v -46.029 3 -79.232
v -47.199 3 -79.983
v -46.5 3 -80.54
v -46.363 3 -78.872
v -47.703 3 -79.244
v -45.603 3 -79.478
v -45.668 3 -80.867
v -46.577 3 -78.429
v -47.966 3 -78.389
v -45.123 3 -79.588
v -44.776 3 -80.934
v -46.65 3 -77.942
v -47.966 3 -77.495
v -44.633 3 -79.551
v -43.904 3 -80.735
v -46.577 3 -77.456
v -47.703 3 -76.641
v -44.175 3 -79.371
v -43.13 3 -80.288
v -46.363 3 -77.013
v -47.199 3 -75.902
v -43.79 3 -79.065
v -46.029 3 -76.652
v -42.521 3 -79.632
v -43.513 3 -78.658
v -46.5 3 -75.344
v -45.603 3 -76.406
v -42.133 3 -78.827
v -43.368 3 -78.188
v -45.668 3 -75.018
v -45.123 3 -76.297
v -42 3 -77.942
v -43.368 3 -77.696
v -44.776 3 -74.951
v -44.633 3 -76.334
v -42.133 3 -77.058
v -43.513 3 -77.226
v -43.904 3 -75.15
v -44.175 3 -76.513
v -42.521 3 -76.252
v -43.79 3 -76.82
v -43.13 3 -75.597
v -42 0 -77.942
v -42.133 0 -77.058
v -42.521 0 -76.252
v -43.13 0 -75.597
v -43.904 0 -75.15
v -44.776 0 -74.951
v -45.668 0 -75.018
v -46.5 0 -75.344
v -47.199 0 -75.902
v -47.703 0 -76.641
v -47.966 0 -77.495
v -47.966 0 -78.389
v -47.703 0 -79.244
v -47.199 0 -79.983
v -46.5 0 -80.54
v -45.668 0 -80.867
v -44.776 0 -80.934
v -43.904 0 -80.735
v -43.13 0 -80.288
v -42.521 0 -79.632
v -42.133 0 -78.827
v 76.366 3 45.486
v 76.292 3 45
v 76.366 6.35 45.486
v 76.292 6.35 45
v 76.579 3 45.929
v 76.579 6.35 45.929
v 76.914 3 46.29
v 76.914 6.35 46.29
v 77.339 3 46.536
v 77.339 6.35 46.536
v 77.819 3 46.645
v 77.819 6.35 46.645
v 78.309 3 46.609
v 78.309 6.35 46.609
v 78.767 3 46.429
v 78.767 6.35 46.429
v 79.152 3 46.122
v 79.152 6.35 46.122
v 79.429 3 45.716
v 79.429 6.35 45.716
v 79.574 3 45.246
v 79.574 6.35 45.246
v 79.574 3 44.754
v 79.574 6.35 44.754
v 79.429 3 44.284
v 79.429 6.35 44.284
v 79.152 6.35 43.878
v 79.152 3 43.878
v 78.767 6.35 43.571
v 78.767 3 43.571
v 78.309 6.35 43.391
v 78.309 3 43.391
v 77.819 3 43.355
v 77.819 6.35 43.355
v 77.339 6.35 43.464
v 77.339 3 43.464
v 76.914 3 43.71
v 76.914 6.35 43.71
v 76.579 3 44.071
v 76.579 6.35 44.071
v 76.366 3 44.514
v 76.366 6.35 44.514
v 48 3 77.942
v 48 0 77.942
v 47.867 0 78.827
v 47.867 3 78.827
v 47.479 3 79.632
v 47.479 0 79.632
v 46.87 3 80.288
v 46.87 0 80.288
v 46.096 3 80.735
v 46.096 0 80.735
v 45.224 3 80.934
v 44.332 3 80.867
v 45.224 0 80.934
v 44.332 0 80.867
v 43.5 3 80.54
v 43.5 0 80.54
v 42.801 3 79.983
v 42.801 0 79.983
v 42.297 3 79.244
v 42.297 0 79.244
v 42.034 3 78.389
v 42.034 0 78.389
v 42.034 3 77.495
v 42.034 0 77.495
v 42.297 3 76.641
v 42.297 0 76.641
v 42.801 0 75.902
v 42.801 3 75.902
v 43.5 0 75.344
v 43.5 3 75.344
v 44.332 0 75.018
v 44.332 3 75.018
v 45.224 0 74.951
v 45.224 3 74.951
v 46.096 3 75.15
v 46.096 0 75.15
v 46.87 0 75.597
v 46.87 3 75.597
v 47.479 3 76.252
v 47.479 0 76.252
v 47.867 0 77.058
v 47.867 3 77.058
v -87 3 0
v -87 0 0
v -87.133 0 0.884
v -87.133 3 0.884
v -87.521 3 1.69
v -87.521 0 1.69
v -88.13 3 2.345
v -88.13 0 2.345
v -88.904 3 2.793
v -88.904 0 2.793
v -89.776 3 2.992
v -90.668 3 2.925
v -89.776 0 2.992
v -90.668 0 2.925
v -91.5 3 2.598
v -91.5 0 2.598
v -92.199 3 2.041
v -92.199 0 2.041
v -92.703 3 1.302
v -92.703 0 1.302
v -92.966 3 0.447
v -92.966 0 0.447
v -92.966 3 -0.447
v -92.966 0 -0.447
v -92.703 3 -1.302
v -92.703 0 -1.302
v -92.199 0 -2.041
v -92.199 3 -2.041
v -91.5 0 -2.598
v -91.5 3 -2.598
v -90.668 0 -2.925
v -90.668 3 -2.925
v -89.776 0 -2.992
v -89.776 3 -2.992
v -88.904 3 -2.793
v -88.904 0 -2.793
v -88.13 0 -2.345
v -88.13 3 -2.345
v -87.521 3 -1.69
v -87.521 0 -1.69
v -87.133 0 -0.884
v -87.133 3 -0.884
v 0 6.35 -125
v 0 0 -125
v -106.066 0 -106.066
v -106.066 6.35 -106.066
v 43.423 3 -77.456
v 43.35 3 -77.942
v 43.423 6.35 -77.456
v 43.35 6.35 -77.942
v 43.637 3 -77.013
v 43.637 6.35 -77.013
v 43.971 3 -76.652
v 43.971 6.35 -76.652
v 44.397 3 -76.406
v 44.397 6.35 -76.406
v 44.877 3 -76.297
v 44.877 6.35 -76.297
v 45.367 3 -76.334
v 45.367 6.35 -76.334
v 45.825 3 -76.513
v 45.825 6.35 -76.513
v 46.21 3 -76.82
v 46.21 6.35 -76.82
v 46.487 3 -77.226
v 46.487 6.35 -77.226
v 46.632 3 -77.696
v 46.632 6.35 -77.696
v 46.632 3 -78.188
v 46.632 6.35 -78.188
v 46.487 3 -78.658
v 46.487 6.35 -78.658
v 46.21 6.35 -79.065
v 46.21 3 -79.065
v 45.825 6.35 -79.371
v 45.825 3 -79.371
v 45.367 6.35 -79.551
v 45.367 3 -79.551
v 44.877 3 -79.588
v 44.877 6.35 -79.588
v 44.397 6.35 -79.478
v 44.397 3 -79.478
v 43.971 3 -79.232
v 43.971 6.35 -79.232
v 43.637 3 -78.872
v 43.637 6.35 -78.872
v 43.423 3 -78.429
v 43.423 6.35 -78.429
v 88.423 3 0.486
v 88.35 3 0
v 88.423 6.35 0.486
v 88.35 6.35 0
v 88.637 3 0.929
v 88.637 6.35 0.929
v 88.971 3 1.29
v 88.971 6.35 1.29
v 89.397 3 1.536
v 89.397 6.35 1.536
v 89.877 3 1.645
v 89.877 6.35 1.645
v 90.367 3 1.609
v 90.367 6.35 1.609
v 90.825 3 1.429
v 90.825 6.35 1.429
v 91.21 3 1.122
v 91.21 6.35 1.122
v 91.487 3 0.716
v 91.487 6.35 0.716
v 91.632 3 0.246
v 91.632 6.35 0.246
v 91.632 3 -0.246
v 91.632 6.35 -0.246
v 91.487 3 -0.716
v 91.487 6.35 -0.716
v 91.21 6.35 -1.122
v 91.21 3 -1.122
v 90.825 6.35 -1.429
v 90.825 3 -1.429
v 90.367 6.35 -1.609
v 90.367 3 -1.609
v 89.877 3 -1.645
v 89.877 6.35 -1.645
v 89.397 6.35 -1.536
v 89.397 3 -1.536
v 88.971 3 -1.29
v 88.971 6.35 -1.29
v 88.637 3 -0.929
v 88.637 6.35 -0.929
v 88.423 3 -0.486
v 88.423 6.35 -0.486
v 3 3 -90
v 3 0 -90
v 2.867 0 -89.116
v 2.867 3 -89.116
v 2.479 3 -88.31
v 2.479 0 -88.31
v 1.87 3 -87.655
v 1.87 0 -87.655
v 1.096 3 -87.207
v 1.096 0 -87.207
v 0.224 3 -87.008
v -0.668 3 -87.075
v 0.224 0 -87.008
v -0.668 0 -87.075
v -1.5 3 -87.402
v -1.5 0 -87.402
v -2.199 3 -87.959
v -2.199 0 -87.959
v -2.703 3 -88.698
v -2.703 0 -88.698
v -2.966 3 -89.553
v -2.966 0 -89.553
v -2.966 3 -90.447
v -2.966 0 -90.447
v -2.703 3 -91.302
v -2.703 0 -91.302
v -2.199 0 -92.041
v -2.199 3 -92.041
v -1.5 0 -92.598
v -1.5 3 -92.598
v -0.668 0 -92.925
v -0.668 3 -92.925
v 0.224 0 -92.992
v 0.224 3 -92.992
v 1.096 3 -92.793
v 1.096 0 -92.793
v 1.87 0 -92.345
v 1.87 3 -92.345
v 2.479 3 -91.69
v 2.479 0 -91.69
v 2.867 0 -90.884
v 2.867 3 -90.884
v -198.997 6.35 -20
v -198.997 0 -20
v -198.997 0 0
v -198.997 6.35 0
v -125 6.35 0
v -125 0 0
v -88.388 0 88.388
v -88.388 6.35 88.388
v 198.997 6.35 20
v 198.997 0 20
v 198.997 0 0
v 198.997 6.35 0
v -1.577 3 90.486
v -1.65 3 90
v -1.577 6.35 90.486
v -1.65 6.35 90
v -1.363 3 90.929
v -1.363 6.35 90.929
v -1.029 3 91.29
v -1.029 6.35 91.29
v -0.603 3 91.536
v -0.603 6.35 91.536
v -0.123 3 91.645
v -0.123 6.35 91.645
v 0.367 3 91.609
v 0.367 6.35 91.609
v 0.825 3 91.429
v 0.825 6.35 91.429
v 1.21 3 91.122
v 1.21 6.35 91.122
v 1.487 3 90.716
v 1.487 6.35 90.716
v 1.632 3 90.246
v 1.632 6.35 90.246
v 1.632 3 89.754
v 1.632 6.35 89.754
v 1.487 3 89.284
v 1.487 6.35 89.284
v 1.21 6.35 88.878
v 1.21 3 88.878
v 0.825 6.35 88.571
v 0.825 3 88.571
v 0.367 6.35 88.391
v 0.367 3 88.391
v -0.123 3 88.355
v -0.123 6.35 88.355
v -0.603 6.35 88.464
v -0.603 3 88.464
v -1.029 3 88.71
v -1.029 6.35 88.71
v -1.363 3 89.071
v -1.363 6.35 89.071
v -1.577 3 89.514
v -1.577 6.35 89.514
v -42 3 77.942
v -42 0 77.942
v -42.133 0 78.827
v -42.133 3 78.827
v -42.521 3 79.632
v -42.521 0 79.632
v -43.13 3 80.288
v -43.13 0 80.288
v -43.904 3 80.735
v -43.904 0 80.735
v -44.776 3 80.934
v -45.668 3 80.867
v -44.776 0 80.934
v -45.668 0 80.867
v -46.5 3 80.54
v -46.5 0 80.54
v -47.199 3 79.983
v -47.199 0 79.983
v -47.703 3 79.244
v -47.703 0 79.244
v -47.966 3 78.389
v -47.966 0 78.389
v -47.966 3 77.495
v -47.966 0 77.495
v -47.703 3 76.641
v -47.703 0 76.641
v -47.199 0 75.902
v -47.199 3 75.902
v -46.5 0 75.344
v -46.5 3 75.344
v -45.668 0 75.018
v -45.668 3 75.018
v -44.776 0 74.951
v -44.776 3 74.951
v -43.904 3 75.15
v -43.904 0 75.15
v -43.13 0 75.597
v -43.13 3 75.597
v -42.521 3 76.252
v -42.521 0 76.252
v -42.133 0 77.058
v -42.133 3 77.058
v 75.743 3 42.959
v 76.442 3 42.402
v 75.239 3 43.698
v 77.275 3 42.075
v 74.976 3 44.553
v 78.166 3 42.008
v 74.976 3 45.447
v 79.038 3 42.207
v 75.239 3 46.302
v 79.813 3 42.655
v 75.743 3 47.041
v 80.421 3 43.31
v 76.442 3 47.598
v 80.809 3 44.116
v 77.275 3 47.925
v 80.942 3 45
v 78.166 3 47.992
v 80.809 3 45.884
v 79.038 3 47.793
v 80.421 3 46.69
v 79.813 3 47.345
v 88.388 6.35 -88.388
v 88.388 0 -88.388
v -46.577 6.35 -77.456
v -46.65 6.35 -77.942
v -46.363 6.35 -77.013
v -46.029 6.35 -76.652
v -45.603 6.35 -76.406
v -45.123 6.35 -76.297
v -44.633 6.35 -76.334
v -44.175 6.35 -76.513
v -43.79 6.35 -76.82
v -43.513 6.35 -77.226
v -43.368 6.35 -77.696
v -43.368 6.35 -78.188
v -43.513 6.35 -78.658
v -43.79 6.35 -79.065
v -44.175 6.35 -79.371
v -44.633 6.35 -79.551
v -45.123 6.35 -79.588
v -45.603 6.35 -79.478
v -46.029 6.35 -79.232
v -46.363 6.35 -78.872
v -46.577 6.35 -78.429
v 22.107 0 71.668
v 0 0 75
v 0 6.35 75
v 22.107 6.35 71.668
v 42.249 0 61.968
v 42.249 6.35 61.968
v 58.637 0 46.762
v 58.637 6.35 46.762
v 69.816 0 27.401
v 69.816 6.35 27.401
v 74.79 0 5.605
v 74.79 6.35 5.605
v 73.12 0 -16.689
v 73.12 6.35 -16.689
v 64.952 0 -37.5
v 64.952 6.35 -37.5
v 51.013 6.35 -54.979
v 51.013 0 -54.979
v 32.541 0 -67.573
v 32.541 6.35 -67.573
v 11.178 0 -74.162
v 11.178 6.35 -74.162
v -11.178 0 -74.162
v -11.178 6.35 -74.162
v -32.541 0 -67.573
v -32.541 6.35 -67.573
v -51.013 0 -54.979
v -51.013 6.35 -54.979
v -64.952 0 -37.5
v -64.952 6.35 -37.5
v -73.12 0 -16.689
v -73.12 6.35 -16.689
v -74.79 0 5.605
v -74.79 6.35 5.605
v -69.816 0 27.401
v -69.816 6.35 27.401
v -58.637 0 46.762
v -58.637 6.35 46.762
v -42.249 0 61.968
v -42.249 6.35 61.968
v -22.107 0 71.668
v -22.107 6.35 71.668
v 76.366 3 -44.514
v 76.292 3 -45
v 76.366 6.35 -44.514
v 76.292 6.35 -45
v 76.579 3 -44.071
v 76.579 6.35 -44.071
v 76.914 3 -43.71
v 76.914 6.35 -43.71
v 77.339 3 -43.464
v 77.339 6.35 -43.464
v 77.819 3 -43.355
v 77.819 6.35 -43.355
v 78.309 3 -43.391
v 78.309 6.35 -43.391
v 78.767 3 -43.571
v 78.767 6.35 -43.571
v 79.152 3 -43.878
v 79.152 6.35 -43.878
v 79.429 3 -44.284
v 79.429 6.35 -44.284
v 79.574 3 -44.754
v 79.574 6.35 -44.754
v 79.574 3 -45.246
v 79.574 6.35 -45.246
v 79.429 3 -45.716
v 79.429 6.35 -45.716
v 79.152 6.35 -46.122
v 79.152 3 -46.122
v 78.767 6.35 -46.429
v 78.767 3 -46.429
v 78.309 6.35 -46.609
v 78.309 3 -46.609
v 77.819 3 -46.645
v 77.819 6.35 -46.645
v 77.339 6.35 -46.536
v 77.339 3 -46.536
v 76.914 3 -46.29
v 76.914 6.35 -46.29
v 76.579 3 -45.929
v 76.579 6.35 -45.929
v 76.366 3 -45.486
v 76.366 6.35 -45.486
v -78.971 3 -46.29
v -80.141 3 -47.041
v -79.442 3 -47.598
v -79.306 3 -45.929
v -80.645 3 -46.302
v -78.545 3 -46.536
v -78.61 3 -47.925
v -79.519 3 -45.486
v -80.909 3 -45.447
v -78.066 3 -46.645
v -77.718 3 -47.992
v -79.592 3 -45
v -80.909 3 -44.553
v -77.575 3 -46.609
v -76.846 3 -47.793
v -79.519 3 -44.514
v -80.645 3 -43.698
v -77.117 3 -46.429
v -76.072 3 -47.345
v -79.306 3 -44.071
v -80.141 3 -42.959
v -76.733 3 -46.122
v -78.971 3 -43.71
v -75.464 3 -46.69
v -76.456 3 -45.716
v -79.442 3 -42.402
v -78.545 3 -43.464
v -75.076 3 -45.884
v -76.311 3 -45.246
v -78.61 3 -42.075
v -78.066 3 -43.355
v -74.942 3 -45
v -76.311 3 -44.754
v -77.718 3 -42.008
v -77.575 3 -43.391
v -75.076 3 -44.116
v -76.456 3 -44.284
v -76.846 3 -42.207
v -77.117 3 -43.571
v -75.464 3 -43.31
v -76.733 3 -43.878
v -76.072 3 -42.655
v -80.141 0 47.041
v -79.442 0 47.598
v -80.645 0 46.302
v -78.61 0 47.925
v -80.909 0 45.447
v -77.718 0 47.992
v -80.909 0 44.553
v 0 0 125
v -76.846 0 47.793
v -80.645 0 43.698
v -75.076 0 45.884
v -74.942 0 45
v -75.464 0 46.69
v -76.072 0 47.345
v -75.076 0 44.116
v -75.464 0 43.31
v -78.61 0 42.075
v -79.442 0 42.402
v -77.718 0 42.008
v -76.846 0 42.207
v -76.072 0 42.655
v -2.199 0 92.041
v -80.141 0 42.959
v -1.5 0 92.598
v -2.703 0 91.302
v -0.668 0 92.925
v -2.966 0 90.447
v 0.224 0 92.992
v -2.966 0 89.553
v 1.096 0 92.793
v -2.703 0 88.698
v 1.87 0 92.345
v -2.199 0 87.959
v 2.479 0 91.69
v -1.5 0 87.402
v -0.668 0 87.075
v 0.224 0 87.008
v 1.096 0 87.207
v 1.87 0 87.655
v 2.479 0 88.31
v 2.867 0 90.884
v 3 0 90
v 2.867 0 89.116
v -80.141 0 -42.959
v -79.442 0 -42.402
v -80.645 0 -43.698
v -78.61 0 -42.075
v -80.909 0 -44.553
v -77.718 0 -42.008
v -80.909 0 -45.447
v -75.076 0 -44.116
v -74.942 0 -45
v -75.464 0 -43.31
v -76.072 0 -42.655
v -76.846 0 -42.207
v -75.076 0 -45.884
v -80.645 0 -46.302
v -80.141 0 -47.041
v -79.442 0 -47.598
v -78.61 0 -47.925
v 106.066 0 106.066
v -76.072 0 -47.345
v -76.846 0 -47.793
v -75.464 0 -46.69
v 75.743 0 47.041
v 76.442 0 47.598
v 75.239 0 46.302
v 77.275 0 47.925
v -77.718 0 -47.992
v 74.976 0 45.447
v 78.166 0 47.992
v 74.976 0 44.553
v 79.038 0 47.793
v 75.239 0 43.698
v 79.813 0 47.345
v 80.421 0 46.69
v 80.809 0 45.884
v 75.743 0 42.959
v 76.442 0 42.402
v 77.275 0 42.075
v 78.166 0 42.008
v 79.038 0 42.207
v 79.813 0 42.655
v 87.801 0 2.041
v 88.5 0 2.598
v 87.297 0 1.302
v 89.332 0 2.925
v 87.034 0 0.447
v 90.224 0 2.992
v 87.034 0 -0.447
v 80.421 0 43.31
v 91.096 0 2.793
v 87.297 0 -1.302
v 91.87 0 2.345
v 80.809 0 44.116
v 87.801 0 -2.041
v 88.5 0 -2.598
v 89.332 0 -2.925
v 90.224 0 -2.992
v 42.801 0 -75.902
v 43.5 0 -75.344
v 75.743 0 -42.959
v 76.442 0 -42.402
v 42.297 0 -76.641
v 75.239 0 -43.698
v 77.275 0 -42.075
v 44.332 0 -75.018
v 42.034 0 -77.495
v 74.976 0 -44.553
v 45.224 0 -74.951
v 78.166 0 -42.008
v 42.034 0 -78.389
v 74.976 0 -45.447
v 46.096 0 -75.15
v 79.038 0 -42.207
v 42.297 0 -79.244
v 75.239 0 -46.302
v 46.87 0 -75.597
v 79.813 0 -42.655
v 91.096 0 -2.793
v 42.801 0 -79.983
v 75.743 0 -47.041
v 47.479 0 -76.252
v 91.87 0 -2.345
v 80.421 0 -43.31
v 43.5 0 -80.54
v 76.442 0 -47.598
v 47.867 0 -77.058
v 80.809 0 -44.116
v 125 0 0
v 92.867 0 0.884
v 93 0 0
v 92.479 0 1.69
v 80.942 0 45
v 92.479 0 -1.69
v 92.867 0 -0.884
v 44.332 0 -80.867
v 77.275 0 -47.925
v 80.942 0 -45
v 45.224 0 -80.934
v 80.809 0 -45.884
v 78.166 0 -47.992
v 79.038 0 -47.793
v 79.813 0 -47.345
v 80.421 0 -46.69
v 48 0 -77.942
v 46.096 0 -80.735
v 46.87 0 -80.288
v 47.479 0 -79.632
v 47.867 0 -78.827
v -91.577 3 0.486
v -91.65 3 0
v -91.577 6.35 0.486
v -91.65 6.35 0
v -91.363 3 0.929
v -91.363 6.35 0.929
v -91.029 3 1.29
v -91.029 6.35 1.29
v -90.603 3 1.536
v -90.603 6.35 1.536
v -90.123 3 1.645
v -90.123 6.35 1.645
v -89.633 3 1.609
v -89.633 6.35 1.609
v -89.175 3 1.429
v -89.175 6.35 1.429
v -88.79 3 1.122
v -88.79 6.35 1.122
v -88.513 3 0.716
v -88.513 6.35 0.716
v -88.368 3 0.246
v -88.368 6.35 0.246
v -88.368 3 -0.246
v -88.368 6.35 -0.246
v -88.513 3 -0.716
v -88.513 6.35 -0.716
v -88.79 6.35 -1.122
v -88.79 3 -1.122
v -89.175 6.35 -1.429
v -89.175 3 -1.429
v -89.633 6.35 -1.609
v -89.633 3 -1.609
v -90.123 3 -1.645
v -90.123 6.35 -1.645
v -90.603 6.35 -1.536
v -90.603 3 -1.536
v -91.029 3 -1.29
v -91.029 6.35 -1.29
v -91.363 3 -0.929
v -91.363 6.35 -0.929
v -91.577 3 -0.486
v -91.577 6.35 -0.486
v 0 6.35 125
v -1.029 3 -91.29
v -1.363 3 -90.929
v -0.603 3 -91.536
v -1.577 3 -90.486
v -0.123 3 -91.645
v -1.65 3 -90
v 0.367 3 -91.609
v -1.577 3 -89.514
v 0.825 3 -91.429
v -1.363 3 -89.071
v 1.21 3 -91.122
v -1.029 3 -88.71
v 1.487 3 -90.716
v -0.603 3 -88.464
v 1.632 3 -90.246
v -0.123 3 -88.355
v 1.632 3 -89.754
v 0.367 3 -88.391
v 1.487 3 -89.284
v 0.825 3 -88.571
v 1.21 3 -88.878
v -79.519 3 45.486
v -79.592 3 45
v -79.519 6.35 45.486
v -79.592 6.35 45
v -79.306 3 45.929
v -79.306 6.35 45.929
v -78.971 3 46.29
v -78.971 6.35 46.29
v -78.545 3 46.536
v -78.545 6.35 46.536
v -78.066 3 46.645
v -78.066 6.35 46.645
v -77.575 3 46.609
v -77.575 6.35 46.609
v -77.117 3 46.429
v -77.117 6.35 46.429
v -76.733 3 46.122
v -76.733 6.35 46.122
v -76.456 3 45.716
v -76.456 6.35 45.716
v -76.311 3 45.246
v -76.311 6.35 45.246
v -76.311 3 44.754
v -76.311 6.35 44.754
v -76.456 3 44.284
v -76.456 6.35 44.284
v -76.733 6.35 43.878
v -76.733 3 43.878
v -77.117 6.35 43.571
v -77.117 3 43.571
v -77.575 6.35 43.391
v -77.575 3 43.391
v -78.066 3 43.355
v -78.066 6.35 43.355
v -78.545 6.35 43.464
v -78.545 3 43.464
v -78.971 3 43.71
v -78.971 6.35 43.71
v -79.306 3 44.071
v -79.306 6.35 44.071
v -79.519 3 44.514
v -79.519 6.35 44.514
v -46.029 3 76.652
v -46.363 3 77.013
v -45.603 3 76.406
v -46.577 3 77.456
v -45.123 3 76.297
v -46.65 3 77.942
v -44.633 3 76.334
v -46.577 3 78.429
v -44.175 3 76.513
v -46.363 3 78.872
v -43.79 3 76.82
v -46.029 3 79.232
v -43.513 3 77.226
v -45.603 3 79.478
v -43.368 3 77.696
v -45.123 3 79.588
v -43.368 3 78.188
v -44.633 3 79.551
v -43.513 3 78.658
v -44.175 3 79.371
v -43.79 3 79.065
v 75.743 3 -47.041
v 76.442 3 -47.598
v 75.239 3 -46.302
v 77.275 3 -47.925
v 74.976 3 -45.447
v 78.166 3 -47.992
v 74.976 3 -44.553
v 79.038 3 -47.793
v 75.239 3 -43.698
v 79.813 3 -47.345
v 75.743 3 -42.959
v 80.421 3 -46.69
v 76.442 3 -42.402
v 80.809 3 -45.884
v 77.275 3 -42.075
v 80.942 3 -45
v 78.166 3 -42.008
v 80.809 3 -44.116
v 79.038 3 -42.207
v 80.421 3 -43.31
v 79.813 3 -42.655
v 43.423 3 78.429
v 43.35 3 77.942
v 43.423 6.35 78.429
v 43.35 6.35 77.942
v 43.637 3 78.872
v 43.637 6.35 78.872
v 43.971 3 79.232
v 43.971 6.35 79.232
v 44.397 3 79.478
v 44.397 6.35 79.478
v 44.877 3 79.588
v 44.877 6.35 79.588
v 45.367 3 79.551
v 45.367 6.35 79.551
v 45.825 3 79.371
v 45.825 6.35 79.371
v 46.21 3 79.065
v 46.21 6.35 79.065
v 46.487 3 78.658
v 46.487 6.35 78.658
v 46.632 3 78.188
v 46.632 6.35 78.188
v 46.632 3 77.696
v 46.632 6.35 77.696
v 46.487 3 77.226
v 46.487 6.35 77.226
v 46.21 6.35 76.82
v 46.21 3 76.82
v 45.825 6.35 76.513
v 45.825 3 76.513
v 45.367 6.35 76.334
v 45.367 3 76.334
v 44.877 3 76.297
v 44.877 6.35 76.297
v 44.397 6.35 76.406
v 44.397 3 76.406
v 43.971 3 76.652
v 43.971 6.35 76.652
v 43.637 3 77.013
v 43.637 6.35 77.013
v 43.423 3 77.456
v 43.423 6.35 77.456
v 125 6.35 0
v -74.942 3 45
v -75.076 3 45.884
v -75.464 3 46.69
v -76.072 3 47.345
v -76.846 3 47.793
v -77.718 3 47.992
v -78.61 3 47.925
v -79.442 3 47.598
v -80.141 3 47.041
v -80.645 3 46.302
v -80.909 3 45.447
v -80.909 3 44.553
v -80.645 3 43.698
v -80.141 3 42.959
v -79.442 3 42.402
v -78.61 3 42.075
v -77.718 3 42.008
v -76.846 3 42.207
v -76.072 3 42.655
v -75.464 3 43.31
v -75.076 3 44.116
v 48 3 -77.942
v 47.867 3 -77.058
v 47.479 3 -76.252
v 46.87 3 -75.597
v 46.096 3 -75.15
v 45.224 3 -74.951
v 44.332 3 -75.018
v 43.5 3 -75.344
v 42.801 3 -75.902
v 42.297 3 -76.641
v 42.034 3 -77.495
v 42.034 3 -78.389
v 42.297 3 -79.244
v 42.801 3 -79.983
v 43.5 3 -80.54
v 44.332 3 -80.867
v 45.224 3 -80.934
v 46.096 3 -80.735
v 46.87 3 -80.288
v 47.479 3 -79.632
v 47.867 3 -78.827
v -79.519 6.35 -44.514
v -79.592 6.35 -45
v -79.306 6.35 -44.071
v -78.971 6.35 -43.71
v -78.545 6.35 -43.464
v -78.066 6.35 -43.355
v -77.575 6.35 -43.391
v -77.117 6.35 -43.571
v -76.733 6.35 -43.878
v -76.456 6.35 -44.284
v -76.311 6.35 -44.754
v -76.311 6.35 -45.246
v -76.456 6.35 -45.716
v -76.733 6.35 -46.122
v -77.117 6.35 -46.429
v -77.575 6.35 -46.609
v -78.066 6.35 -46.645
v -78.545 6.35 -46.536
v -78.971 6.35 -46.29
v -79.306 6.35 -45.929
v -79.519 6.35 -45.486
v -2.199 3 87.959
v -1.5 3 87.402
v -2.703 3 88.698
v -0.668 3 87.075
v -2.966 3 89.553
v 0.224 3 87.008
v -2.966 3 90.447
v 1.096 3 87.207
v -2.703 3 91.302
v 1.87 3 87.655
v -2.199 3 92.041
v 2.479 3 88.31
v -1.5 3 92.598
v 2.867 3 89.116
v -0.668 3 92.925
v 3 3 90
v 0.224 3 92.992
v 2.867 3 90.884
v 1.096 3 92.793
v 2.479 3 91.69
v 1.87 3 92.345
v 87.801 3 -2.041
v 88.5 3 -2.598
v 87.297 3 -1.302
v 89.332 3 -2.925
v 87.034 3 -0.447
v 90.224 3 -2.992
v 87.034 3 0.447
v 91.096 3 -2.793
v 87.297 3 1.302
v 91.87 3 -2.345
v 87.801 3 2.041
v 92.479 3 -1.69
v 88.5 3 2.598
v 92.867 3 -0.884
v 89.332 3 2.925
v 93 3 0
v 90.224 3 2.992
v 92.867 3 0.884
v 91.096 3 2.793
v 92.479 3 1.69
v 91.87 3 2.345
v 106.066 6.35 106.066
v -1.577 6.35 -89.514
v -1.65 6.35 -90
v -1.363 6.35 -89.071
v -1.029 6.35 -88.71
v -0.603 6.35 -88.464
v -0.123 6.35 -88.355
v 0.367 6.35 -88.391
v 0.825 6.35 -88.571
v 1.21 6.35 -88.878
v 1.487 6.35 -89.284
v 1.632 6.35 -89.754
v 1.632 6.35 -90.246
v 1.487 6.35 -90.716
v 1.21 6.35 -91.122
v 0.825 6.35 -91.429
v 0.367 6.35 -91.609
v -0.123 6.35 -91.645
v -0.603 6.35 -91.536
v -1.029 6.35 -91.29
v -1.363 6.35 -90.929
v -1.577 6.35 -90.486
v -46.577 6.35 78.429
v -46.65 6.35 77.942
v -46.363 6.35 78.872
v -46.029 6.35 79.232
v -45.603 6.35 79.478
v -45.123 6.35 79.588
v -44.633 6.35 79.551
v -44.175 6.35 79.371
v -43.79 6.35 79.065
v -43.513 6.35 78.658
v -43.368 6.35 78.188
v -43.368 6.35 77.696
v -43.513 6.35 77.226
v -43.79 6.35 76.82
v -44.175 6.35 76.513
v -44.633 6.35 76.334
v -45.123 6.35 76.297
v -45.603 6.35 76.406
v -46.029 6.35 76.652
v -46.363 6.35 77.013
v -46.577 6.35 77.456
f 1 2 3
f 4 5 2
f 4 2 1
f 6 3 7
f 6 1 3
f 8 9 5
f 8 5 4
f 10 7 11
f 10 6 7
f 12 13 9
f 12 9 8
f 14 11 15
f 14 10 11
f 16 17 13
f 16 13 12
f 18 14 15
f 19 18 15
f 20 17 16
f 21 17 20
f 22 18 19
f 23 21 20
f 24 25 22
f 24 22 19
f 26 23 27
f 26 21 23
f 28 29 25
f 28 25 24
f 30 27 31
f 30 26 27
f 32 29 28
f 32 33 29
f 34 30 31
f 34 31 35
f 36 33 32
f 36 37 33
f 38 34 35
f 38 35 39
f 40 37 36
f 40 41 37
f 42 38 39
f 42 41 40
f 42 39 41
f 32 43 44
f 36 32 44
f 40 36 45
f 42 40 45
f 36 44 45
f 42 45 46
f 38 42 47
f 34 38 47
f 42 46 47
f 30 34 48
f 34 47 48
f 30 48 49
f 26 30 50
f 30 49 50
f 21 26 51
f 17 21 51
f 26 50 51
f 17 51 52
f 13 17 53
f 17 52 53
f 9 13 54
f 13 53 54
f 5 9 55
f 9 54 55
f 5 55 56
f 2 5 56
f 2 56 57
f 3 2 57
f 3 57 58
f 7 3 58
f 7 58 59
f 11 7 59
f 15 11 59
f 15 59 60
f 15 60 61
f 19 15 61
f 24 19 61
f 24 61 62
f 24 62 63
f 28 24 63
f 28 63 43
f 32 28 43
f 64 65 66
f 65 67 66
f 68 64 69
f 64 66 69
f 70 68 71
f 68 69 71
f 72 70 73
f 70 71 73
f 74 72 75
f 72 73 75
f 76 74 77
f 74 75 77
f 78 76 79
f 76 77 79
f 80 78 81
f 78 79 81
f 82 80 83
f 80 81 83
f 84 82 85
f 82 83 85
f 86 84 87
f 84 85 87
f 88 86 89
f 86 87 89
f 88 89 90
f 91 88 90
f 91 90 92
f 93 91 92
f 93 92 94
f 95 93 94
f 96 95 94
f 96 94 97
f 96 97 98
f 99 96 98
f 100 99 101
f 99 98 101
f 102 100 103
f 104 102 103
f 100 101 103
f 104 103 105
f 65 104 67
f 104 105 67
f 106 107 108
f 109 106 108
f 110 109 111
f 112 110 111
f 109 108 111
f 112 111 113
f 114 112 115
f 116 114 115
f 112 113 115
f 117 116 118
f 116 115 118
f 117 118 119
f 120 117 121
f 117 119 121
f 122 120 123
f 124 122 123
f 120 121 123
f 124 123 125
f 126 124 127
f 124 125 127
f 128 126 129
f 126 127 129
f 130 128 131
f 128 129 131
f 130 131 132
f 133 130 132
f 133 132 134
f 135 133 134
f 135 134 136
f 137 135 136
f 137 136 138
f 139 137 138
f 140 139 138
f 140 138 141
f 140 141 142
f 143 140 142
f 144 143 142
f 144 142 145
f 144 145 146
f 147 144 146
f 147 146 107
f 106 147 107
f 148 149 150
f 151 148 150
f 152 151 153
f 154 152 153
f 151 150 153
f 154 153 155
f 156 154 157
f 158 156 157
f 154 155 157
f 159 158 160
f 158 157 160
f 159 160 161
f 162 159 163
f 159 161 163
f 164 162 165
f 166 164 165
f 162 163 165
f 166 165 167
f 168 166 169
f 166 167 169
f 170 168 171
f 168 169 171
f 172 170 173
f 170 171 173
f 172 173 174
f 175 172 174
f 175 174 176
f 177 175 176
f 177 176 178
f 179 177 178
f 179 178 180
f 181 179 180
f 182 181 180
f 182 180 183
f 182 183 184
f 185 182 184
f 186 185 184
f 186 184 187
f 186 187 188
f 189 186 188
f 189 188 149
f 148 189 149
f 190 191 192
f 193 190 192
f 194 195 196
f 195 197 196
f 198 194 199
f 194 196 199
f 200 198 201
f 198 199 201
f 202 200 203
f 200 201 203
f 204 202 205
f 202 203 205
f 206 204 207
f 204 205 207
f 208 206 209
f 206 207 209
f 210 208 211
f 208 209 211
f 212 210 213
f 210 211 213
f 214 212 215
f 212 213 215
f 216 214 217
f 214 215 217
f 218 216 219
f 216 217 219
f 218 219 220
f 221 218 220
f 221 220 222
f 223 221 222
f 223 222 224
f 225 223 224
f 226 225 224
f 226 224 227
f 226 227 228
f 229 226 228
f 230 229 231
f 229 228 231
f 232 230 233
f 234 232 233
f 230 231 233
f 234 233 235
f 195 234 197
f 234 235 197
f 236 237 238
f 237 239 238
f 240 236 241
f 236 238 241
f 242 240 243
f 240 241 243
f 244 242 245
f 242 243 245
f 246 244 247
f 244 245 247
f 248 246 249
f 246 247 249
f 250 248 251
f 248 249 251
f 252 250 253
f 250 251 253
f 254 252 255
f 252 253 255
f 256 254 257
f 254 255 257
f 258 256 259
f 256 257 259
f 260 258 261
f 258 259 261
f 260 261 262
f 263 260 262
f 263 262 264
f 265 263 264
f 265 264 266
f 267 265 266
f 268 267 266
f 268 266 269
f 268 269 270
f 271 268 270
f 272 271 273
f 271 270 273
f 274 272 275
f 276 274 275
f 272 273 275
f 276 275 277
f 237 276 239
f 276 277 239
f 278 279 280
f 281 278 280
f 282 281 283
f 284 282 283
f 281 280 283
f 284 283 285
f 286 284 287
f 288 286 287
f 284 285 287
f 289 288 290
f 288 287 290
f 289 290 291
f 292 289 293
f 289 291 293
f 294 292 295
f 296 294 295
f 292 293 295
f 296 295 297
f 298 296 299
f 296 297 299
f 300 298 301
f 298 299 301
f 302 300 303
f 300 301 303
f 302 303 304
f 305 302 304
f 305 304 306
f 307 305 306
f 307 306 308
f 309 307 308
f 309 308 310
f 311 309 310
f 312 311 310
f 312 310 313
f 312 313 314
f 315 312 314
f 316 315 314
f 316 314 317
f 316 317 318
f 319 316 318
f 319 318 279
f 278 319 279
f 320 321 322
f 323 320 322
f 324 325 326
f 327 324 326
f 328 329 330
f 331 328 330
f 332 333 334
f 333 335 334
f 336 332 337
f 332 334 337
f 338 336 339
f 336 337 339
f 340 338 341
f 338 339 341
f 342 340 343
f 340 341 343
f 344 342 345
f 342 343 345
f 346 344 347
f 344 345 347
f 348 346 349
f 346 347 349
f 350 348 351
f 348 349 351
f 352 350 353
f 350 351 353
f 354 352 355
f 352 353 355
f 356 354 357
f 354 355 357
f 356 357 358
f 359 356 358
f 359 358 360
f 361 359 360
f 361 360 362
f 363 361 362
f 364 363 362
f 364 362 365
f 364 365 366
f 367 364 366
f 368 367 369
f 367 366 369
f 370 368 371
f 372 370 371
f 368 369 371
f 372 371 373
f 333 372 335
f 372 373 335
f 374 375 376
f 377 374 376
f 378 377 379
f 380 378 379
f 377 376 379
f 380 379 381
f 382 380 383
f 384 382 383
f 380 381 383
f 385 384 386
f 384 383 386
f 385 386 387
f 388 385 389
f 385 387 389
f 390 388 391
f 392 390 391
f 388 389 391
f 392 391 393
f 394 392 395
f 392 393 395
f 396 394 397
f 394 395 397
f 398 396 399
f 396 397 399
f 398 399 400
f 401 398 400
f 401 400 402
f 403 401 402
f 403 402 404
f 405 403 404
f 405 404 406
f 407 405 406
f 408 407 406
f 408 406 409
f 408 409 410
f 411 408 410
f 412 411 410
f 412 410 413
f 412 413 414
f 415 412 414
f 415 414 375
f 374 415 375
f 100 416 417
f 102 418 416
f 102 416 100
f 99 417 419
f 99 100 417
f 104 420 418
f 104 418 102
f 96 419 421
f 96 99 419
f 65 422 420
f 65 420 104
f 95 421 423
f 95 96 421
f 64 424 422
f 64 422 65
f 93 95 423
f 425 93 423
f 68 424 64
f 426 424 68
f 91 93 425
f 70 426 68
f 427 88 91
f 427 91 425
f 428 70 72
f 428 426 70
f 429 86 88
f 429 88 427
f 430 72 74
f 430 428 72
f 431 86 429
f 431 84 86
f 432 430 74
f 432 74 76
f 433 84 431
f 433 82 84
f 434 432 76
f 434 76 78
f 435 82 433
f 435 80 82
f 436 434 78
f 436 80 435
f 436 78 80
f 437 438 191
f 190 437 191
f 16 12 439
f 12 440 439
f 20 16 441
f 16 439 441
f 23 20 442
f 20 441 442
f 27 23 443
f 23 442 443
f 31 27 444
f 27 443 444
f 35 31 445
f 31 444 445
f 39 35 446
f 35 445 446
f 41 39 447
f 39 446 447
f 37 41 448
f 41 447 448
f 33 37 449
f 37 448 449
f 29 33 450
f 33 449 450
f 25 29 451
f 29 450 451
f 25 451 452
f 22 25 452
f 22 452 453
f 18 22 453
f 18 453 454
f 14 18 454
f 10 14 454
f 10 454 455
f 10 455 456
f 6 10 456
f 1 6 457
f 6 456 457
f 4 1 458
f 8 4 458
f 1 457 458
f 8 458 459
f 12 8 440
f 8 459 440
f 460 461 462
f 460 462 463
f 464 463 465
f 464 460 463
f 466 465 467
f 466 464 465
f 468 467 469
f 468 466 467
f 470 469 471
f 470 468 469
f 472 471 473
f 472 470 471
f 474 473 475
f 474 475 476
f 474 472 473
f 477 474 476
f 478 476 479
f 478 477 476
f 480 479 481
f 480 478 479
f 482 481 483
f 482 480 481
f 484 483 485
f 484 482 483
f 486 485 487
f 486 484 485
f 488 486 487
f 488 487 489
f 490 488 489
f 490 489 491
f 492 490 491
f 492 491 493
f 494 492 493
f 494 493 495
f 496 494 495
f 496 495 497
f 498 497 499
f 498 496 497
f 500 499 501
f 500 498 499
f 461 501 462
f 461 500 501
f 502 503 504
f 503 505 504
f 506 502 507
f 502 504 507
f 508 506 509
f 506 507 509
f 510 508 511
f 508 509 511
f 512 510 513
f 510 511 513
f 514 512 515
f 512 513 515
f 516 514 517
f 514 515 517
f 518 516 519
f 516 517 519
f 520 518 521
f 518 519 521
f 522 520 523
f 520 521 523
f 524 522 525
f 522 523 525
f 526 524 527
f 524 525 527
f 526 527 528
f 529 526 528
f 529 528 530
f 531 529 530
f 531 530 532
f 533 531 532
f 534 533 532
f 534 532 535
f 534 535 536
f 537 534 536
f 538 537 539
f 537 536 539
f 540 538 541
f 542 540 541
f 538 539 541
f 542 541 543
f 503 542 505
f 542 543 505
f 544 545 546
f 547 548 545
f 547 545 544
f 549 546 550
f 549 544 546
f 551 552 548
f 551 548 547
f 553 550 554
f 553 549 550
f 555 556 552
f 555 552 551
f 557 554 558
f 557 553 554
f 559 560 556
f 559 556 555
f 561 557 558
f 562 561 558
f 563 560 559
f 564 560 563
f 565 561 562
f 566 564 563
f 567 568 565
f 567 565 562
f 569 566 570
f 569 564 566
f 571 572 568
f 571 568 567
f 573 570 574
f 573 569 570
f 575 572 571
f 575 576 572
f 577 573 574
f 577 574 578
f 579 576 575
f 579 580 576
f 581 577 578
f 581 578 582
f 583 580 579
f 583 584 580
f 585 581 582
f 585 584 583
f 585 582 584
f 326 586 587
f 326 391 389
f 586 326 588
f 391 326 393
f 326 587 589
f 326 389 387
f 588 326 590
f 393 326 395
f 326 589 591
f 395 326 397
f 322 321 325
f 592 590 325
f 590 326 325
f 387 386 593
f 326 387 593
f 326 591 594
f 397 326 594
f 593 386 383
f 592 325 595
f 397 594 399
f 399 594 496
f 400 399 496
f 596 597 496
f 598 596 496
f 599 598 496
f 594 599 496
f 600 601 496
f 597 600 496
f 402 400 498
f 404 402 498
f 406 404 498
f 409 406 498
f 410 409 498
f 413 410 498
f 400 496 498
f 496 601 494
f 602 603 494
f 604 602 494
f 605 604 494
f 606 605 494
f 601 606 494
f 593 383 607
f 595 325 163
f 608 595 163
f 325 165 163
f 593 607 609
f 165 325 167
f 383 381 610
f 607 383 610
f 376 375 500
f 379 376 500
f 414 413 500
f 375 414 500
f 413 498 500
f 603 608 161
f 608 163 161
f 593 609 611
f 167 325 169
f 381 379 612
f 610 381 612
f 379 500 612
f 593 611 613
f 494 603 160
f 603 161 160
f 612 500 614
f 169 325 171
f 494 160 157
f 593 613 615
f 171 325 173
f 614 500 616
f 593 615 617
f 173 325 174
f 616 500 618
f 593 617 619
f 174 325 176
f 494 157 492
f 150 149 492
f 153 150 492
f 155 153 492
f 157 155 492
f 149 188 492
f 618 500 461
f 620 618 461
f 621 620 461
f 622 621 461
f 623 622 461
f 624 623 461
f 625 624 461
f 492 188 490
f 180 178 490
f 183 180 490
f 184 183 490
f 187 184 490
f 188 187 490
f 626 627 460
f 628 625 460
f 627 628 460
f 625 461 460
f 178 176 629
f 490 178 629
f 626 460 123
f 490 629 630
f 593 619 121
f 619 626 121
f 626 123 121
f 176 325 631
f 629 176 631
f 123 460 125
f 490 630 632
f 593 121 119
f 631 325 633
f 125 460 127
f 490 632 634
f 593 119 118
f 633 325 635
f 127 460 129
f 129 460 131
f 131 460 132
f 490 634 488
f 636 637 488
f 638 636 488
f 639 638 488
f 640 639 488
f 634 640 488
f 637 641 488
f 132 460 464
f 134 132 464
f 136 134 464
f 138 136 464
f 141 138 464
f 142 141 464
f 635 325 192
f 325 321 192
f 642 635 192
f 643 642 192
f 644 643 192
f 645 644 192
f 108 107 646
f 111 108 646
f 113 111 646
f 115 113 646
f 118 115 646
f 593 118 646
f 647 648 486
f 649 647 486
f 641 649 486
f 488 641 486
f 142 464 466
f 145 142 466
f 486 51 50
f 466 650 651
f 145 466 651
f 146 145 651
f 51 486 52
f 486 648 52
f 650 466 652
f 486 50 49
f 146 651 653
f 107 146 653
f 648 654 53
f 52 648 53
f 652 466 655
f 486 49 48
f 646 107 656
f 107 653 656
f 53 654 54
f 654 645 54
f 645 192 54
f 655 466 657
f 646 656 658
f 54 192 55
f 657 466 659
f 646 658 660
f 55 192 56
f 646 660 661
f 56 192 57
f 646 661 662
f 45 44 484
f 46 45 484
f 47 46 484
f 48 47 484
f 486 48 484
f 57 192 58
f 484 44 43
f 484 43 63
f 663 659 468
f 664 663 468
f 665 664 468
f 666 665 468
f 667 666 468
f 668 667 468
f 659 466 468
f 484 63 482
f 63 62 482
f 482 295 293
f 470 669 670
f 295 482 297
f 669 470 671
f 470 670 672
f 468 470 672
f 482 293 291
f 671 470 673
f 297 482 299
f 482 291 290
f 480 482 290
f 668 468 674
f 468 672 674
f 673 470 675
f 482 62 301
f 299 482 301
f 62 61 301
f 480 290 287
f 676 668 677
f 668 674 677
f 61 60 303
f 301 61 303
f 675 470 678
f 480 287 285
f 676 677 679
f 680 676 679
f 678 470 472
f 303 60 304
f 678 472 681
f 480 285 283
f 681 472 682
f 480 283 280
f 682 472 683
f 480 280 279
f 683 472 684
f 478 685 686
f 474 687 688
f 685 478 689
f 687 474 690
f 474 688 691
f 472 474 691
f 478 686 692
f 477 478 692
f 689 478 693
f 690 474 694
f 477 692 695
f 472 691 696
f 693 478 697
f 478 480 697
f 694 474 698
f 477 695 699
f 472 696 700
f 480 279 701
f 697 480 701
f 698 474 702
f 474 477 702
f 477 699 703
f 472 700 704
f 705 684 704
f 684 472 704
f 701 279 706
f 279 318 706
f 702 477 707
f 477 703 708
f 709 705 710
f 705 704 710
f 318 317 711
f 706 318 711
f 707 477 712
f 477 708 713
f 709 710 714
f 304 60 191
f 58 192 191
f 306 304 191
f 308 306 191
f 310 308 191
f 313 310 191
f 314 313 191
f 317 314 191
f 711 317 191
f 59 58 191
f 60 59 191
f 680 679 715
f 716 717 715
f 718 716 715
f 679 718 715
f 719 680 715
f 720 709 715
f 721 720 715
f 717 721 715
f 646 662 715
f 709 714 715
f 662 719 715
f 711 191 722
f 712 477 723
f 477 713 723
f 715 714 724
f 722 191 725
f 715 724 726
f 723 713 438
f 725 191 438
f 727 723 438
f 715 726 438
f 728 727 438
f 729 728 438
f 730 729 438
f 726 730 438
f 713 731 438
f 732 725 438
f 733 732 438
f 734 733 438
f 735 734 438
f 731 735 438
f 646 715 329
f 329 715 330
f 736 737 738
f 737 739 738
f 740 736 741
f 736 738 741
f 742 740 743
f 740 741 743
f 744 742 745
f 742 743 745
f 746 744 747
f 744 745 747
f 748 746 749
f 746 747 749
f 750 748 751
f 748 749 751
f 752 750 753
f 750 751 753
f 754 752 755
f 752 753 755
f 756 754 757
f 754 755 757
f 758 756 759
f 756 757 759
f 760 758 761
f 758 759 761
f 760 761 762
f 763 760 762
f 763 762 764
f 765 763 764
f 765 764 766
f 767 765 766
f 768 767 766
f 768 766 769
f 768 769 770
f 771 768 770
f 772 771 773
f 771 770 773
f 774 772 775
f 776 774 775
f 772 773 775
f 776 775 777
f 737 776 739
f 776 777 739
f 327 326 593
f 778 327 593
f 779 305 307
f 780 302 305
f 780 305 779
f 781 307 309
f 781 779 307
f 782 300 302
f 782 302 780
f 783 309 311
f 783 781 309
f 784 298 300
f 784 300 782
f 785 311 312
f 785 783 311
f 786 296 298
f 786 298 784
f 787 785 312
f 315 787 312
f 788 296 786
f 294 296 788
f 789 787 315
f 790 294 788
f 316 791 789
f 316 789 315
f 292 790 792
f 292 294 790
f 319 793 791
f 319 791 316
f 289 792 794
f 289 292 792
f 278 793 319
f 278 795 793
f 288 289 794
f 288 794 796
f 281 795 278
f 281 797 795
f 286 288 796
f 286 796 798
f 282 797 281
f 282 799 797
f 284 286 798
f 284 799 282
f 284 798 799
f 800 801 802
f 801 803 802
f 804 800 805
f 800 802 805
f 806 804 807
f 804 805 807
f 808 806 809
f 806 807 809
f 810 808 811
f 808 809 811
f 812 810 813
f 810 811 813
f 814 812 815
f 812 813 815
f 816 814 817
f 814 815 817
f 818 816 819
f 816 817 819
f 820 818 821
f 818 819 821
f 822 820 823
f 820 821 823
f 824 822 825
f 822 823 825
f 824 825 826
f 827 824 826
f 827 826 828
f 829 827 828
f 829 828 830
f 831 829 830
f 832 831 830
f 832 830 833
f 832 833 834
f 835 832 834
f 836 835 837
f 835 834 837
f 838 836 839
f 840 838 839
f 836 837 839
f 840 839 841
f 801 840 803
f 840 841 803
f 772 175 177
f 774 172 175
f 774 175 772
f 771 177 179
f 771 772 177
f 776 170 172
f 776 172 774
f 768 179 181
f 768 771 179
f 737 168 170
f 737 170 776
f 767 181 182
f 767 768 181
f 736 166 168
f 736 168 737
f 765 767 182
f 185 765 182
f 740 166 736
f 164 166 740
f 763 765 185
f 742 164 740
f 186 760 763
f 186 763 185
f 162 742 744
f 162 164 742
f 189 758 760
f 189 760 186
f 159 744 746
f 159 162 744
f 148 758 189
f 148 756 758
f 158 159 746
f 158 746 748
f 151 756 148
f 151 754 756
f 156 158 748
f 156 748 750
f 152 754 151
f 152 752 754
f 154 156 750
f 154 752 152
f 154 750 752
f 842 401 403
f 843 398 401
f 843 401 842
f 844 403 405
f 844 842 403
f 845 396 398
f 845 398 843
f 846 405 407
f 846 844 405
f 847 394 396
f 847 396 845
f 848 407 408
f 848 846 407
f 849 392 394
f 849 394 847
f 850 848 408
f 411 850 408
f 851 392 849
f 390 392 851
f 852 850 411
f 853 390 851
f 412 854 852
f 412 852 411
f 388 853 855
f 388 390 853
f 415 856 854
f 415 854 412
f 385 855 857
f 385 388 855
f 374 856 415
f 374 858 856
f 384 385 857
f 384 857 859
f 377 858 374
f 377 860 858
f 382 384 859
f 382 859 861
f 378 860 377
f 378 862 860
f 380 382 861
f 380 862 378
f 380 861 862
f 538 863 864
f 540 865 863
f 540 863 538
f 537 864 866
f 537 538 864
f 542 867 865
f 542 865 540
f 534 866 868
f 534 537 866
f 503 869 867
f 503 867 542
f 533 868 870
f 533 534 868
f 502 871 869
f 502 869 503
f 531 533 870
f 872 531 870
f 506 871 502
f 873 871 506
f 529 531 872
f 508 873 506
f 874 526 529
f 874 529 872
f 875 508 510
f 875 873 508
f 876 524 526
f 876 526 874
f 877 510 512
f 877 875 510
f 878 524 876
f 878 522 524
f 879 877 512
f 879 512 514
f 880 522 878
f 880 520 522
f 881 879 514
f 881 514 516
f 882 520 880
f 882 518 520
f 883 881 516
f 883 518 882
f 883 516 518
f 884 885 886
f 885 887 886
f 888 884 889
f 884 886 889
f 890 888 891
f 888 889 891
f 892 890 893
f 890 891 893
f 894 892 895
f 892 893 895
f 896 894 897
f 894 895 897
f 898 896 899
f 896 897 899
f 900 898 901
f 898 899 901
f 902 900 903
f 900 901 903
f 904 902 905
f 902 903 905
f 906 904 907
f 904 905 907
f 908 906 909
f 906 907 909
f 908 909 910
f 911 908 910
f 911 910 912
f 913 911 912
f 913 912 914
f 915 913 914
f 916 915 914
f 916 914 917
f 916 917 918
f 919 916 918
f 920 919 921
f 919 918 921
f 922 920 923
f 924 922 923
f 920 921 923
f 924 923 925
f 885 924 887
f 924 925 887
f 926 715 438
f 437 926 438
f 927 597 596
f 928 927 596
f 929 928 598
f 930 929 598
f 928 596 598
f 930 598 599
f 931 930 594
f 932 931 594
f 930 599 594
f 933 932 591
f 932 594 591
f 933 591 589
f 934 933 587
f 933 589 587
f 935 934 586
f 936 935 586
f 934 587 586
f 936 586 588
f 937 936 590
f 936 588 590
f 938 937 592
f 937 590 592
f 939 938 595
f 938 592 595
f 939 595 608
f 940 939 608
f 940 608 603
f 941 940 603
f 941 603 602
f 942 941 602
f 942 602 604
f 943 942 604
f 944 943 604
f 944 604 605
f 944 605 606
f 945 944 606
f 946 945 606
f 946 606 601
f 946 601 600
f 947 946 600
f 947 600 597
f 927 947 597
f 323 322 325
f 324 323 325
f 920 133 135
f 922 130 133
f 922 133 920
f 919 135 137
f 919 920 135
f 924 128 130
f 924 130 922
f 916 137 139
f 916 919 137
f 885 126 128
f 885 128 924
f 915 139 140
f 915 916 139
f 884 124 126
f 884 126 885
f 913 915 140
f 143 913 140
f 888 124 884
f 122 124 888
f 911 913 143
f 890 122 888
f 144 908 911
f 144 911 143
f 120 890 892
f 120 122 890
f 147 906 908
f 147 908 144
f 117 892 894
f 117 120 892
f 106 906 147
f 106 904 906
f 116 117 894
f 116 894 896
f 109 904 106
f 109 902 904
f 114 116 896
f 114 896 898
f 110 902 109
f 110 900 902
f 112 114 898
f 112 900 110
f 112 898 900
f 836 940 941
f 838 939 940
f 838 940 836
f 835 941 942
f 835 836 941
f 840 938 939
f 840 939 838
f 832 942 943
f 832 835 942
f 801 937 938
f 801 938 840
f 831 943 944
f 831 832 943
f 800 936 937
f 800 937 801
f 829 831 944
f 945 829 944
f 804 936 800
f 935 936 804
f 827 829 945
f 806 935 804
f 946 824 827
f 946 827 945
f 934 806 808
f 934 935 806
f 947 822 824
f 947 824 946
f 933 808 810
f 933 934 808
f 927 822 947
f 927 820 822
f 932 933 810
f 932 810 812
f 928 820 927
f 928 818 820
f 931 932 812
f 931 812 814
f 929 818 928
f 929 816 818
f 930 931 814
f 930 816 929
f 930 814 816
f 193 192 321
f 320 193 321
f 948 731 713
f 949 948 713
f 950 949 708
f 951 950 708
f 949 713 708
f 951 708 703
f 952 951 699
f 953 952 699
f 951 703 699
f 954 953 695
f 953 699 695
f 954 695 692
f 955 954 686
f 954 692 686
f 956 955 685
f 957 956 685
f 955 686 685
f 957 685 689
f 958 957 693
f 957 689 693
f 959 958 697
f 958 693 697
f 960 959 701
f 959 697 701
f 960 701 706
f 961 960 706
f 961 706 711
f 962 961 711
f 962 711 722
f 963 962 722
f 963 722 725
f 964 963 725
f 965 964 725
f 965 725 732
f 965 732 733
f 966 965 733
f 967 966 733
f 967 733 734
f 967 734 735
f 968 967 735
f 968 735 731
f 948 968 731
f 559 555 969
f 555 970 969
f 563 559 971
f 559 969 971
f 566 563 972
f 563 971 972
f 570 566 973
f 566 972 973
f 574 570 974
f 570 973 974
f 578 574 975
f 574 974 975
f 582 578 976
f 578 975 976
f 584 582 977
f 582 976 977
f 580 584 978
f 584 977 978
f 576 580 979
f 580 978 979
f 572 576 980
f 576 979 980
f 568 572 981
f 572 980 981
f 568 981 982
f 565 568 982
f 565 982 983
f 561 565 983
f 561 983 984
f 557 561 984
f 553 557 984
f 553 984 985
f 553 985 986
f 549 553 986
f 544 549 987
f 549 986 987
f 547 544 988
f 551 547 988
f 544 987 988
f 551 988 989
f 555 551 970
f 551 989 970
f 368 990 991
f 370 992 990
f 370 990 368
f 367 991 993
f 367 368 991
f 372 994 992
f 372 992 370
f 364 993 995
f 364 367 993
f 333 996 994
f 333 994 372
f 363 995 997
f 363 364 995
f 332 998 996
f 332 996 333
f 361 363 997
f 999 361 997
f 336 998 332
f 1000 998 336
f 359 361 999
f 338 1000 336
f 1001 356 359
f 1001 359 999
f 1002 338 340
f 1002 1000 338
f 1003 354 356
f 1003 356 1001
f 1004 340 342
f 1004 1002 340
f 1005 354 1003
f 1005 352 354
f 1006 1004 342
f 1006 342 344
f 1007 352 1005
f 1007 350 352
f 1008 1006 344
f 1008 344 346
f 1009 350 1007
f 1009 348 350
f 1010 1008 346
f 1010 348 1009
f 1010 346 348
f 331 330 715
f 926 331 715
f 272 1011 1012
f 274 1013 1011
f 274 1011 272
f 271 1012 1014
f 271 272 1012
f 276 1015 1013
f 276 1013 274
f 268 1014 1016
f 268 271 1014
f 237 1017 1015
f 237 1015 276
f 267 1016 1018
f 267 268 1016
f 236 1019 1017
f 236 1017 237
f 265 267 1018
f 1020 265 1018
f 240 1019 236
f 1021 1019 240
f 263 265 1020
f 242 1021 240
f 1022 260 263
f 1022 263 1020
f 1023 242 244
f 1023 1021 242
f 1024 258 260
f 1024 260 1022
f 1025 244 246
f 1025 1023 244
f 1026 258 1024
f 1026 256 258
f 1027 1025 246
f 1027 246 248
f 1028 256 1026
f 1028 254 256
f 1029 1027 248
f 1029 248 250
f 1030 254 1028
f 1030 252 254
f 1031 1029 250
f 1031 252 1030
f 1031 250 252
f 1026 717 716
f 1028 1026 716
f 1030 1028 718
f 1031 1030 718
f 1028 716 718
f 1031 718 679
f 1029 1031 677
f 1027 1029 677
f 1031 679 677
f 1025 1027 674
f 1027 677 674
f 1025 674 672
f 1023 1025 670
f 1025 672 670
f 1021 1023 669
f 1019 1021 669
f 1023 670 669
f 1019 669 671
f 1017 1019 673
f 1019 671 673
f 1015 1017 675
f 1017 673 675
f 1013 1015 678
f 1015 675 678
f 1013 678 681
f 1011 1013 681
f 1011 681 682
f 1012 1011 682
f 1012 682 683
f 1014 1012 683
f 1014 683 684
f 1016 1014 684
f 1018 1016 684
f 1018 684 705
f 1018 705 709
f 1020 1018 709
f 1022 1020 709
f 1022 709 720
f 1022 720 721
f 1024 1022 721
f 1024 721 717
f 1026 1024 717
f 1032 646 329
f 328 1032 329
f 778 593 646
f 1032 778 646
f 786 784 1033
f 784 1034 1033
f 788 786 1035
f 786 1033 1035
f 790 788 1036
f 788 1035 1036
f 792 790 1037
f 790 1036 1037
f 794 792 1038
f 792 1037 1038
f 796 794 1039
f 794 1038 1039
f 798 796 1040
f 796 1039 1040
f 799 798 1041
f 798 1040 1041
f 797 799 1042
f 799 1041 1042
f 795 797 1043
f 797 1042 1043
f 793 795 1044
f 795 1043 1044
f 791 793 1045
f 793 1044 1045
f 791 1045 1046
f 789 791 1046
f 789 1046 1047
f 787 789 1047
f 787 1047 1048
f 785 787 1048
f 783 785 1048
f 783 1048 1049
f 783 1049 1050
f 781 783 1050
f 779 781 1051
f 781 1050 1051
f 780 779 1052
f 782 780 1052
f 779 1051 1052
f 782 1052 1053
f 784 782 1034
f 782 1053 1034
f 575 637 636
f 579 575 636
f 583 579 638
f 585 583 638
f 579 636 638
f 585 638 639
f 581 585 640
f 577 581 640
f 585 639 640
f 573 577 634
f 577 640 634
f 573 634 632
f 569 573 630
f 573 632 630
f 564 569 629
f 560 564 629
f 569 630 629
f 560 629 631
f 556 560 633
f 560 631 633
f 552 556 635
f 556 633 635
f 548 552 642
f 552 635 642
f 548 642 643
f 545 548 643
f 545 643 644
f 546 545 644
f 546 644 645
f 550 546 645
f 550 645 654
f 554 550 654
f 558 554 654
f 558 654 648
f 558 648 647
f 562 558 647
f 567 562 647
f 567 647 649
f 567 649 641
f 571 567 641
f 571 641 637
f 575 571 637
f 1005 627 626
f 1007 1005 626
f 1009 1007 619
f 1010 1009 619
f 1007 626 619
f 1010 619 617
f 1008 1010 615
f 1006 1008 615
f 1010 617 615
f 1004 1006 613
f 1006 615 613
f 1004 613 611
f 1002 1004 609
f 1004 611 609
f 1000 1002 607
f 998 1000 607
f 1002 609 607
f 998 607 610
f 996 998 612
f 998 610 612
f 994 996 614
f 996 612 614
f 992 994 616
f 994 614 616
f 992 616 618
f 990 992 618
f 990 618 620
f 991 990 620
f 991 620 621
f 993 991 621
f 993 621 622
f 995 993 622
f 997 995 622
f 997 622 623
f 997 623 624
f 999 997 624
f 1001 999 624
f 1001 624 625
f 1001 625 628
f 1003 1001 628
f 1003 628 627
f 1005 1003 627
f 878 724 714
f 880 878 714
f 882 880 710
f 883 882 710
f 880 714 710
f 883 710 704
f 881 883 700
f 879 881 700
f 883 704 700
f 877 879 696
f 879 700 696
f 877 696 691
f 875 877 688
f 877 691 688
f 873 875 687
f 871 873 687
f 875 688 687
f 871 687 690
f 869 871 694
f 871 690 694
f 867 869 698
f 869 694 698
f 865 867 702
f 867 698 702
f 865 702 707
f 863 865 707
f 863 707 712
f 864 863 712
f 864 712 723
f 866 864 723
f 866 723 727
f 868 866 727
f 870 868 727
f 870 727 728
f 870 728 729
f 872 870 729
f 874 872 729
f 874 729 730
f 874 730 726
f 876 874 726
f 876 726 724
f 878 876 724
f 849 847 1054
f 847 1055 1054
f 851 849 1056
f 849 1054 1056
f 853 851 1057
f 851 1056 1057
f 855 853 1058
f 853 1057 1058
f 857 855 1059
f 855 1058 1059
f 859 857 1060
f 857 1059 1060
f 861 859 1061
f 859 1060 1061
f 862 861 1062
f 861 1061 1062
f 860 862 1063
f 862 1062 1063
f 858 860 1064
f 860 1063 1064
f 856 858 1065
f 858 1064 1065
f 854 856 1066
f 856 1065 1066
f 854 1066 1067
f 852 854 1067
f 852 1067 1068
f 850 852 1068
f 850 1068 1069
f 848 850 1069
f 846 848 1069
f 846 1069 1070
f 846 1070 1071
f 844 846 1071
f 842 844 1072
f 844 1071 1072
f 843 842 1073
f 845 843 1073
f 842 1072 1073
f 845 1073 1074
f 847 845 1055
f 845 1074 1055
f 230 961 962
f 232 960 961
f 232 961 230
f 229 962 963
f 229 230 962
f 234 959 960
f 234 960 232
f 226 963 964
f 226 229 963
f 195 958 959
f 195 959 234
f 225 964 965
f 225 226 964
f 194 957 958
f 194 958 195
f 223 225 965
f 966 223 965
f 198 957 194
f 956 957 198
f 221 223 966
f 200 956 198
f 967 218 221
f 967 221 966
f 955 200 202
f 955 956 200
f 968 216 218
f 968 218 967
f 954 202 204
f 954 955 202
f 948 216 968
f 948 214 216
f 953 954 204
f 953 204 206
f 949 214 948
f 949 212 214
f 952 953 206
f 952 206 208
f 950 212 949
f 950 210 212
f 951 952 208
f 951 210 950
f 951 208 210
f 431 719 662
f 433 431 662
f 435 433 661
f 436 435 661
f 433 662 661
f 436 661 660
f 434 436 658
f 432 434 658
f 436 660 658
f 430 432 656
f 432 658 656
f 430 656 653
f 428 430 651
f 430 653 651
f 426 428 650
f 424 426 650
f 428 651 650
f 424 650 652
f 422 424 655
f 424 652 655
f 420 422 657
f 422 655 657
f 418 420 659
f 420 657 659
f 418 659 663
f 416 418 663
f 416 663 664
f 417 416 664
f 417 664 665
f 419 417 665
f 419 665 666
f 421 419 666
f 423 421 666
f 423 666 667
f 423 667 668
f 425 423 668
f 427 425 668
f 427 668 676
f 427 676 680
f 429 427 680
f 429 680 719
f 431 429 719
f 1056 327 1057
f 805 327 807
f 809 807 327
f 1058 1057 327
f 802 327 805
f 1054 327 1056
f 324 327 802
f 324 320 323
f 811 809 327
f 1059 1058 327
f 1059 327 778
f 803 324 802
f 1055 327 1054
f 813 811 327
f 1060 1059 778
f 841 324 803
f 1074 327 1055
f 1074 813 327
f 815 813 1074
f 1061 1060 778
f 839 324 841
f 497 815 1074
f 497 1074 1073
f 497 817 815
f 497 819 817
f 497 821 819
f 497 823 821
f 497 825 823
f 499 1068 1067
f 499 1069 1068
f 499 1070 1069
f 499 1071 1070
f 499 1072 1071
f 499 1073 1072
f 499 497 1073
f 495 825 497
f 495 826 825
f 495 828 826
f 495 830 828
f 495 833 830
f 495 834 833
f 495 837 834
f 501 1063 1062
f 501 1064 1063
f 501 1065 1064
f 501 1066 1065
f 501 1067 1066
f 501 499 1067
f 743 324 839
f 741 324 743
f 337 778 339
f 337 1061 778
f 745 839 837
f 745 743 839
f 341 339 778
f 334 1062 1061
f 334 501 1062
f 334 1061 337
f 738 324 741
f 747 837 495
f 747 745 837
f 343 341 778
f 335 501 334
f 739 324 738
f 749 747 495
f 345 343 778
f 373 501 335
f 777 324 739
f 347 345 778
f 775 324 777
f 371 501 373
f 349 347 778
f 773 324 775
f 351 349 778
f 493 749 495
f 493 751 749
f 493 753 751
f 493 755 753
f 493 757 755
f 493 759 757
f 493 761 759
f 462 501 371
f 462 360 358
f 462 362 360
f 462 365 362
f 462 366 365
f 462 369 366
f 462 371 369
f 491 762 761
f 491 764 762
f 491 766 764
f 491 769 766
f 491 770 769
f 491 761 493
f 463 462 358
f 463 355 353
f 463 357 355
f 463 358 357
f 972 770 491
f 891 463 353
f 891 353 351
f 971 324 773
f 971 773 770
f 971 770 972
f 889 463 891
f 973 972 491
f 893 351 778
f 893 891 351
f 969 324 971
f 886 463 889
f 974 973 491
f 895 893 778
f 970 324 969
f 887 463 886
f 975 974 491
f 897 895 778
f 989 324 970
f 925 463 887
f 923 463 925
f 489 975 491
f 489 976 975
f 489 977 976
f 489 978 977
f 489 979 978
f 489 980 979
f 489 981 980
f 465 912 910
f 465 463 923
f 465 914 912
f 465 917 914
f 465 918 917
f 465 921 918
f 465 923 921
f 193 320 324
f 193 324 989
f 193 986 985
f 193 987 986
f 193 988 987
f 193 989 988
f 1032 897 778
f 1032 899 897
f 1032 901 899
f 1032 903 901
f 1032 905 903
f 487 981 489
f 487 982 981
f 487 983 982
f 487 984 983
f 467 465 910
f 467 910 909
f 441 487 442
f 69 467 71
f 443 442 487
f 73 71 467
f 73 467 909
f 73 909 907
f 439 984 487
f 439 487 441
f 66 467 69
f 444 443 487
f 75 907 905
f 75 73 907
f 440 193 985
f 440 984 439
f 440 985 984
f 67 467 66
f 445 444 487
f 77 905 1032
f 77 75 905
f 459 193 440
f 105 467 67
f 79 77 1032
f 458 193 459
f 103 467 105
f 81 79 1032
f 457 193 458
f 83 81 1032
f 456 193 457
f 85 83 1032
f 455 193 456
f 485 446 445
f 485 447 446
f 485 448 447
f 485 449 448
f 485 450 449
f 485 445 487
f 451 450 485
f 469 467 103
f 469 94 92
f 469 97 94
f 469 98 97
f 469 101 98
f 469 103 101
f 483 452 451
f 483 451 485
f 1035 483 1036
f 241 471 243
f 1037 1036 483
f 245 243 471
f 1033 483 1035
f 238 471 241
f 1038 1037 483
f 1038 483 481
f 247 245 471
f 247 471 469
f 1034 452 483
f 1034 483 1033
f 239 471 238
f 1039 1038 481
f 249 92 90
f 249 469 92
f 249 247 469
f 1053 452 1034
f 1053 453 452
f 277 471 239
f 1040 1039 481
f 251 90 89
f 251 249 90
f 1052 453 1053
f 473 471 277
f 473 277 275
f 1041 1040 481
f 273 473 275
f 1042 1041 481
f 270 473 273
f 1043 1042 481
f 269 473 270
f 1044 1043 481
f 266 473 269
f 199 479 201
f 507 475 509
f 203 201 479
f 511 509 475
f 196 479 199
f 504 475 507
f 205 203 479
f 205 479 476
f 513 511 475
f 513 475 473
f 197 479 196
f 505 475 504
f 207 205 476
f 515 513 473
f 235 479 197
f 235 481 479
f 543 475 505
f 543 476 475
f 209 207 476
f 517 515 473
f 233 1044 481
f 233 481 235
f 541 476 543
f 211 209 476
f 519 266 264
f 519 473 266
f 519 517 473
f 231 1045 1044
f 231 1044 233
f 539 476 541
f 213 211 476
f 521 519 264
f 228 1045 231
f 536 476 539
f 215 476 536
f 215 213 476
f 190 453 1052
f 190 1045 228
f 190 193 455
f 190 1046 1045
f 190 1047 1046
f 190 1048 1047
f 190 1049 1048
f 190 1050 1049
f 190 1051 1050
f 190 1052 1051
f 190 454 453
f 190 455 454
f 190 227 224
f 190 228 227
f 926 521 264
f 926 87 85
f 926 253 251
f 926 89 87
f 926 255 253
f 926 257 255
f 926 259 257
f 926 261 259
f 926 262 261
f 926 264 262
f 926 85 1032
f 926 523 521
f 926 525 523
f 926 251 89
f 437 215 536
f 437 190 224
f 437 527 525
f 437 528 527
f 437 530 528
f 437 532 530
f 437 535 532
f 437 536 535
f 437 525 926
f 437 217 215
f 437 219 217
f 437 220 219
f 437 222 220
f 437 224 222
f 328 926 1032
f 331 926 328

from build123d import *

# Parameters (mm, degrees)
SKETCH1_R                      = 75
BOSS_EXTRUDE1_DEPTH            = 6.35
CBORE_FOR_M3_SHCS1_D           = 3.3
CBORE_FOR_M3_SHCS1_CBORE_D     = 6
CBORE_FOR_M3_SHCS1_CBORE_DEPTH = 3


with BuildPart() as part:
    # Sketch1 → Boss-Extrude1 (new body)
    with BuildSketch(Plane(origin=(0, 0, 0), x_dir=(1, 0, 0), z_dir=(0, 1, 0))):
        Polygon((125, 0), (88.388347648, 88.388347648), (0, 125), (-106.066017178, 106.066017178), (-198.997487421, 20), (-198.997487421, 0), (-125, 0), (-88.388347648, -88.388347648), (0, -125), (106.066017178, -106.066017178), (198.997487421, -20), (198.997487421, 0), align=None)
        with Locations(Location((0, 0, 0), (0, 0, 270))):
            Circle(SKETCH1_R, mode=Mode.SUBTRACT)
    extrude(amount=BOSS_EXTRUDE1_DEPTH)

    # CBORE for M3 SHCS1 (through all)
    with Locations(Plane.XZ):
        with Locations((90, 0), (77.942286341, 45), (45, 77.942286341), (0, 90), (-45, 77.942286341), (-77.942286341, 45), (-90, 0), (-77.942286341, -45), (-45, -77.942286341), (0, -90), (45, -77.942286341), (77.942286341, -45), (0, 0)):
            CounterBoreHole(CBORE_FOR_M3_SHCS1_D / 2, CBORE_FOR_M3_SHCS1_CBORE_D / 2, CBORE_FOR_M3_SHCS1_CBORE_DEPTH)


solid = part.part
